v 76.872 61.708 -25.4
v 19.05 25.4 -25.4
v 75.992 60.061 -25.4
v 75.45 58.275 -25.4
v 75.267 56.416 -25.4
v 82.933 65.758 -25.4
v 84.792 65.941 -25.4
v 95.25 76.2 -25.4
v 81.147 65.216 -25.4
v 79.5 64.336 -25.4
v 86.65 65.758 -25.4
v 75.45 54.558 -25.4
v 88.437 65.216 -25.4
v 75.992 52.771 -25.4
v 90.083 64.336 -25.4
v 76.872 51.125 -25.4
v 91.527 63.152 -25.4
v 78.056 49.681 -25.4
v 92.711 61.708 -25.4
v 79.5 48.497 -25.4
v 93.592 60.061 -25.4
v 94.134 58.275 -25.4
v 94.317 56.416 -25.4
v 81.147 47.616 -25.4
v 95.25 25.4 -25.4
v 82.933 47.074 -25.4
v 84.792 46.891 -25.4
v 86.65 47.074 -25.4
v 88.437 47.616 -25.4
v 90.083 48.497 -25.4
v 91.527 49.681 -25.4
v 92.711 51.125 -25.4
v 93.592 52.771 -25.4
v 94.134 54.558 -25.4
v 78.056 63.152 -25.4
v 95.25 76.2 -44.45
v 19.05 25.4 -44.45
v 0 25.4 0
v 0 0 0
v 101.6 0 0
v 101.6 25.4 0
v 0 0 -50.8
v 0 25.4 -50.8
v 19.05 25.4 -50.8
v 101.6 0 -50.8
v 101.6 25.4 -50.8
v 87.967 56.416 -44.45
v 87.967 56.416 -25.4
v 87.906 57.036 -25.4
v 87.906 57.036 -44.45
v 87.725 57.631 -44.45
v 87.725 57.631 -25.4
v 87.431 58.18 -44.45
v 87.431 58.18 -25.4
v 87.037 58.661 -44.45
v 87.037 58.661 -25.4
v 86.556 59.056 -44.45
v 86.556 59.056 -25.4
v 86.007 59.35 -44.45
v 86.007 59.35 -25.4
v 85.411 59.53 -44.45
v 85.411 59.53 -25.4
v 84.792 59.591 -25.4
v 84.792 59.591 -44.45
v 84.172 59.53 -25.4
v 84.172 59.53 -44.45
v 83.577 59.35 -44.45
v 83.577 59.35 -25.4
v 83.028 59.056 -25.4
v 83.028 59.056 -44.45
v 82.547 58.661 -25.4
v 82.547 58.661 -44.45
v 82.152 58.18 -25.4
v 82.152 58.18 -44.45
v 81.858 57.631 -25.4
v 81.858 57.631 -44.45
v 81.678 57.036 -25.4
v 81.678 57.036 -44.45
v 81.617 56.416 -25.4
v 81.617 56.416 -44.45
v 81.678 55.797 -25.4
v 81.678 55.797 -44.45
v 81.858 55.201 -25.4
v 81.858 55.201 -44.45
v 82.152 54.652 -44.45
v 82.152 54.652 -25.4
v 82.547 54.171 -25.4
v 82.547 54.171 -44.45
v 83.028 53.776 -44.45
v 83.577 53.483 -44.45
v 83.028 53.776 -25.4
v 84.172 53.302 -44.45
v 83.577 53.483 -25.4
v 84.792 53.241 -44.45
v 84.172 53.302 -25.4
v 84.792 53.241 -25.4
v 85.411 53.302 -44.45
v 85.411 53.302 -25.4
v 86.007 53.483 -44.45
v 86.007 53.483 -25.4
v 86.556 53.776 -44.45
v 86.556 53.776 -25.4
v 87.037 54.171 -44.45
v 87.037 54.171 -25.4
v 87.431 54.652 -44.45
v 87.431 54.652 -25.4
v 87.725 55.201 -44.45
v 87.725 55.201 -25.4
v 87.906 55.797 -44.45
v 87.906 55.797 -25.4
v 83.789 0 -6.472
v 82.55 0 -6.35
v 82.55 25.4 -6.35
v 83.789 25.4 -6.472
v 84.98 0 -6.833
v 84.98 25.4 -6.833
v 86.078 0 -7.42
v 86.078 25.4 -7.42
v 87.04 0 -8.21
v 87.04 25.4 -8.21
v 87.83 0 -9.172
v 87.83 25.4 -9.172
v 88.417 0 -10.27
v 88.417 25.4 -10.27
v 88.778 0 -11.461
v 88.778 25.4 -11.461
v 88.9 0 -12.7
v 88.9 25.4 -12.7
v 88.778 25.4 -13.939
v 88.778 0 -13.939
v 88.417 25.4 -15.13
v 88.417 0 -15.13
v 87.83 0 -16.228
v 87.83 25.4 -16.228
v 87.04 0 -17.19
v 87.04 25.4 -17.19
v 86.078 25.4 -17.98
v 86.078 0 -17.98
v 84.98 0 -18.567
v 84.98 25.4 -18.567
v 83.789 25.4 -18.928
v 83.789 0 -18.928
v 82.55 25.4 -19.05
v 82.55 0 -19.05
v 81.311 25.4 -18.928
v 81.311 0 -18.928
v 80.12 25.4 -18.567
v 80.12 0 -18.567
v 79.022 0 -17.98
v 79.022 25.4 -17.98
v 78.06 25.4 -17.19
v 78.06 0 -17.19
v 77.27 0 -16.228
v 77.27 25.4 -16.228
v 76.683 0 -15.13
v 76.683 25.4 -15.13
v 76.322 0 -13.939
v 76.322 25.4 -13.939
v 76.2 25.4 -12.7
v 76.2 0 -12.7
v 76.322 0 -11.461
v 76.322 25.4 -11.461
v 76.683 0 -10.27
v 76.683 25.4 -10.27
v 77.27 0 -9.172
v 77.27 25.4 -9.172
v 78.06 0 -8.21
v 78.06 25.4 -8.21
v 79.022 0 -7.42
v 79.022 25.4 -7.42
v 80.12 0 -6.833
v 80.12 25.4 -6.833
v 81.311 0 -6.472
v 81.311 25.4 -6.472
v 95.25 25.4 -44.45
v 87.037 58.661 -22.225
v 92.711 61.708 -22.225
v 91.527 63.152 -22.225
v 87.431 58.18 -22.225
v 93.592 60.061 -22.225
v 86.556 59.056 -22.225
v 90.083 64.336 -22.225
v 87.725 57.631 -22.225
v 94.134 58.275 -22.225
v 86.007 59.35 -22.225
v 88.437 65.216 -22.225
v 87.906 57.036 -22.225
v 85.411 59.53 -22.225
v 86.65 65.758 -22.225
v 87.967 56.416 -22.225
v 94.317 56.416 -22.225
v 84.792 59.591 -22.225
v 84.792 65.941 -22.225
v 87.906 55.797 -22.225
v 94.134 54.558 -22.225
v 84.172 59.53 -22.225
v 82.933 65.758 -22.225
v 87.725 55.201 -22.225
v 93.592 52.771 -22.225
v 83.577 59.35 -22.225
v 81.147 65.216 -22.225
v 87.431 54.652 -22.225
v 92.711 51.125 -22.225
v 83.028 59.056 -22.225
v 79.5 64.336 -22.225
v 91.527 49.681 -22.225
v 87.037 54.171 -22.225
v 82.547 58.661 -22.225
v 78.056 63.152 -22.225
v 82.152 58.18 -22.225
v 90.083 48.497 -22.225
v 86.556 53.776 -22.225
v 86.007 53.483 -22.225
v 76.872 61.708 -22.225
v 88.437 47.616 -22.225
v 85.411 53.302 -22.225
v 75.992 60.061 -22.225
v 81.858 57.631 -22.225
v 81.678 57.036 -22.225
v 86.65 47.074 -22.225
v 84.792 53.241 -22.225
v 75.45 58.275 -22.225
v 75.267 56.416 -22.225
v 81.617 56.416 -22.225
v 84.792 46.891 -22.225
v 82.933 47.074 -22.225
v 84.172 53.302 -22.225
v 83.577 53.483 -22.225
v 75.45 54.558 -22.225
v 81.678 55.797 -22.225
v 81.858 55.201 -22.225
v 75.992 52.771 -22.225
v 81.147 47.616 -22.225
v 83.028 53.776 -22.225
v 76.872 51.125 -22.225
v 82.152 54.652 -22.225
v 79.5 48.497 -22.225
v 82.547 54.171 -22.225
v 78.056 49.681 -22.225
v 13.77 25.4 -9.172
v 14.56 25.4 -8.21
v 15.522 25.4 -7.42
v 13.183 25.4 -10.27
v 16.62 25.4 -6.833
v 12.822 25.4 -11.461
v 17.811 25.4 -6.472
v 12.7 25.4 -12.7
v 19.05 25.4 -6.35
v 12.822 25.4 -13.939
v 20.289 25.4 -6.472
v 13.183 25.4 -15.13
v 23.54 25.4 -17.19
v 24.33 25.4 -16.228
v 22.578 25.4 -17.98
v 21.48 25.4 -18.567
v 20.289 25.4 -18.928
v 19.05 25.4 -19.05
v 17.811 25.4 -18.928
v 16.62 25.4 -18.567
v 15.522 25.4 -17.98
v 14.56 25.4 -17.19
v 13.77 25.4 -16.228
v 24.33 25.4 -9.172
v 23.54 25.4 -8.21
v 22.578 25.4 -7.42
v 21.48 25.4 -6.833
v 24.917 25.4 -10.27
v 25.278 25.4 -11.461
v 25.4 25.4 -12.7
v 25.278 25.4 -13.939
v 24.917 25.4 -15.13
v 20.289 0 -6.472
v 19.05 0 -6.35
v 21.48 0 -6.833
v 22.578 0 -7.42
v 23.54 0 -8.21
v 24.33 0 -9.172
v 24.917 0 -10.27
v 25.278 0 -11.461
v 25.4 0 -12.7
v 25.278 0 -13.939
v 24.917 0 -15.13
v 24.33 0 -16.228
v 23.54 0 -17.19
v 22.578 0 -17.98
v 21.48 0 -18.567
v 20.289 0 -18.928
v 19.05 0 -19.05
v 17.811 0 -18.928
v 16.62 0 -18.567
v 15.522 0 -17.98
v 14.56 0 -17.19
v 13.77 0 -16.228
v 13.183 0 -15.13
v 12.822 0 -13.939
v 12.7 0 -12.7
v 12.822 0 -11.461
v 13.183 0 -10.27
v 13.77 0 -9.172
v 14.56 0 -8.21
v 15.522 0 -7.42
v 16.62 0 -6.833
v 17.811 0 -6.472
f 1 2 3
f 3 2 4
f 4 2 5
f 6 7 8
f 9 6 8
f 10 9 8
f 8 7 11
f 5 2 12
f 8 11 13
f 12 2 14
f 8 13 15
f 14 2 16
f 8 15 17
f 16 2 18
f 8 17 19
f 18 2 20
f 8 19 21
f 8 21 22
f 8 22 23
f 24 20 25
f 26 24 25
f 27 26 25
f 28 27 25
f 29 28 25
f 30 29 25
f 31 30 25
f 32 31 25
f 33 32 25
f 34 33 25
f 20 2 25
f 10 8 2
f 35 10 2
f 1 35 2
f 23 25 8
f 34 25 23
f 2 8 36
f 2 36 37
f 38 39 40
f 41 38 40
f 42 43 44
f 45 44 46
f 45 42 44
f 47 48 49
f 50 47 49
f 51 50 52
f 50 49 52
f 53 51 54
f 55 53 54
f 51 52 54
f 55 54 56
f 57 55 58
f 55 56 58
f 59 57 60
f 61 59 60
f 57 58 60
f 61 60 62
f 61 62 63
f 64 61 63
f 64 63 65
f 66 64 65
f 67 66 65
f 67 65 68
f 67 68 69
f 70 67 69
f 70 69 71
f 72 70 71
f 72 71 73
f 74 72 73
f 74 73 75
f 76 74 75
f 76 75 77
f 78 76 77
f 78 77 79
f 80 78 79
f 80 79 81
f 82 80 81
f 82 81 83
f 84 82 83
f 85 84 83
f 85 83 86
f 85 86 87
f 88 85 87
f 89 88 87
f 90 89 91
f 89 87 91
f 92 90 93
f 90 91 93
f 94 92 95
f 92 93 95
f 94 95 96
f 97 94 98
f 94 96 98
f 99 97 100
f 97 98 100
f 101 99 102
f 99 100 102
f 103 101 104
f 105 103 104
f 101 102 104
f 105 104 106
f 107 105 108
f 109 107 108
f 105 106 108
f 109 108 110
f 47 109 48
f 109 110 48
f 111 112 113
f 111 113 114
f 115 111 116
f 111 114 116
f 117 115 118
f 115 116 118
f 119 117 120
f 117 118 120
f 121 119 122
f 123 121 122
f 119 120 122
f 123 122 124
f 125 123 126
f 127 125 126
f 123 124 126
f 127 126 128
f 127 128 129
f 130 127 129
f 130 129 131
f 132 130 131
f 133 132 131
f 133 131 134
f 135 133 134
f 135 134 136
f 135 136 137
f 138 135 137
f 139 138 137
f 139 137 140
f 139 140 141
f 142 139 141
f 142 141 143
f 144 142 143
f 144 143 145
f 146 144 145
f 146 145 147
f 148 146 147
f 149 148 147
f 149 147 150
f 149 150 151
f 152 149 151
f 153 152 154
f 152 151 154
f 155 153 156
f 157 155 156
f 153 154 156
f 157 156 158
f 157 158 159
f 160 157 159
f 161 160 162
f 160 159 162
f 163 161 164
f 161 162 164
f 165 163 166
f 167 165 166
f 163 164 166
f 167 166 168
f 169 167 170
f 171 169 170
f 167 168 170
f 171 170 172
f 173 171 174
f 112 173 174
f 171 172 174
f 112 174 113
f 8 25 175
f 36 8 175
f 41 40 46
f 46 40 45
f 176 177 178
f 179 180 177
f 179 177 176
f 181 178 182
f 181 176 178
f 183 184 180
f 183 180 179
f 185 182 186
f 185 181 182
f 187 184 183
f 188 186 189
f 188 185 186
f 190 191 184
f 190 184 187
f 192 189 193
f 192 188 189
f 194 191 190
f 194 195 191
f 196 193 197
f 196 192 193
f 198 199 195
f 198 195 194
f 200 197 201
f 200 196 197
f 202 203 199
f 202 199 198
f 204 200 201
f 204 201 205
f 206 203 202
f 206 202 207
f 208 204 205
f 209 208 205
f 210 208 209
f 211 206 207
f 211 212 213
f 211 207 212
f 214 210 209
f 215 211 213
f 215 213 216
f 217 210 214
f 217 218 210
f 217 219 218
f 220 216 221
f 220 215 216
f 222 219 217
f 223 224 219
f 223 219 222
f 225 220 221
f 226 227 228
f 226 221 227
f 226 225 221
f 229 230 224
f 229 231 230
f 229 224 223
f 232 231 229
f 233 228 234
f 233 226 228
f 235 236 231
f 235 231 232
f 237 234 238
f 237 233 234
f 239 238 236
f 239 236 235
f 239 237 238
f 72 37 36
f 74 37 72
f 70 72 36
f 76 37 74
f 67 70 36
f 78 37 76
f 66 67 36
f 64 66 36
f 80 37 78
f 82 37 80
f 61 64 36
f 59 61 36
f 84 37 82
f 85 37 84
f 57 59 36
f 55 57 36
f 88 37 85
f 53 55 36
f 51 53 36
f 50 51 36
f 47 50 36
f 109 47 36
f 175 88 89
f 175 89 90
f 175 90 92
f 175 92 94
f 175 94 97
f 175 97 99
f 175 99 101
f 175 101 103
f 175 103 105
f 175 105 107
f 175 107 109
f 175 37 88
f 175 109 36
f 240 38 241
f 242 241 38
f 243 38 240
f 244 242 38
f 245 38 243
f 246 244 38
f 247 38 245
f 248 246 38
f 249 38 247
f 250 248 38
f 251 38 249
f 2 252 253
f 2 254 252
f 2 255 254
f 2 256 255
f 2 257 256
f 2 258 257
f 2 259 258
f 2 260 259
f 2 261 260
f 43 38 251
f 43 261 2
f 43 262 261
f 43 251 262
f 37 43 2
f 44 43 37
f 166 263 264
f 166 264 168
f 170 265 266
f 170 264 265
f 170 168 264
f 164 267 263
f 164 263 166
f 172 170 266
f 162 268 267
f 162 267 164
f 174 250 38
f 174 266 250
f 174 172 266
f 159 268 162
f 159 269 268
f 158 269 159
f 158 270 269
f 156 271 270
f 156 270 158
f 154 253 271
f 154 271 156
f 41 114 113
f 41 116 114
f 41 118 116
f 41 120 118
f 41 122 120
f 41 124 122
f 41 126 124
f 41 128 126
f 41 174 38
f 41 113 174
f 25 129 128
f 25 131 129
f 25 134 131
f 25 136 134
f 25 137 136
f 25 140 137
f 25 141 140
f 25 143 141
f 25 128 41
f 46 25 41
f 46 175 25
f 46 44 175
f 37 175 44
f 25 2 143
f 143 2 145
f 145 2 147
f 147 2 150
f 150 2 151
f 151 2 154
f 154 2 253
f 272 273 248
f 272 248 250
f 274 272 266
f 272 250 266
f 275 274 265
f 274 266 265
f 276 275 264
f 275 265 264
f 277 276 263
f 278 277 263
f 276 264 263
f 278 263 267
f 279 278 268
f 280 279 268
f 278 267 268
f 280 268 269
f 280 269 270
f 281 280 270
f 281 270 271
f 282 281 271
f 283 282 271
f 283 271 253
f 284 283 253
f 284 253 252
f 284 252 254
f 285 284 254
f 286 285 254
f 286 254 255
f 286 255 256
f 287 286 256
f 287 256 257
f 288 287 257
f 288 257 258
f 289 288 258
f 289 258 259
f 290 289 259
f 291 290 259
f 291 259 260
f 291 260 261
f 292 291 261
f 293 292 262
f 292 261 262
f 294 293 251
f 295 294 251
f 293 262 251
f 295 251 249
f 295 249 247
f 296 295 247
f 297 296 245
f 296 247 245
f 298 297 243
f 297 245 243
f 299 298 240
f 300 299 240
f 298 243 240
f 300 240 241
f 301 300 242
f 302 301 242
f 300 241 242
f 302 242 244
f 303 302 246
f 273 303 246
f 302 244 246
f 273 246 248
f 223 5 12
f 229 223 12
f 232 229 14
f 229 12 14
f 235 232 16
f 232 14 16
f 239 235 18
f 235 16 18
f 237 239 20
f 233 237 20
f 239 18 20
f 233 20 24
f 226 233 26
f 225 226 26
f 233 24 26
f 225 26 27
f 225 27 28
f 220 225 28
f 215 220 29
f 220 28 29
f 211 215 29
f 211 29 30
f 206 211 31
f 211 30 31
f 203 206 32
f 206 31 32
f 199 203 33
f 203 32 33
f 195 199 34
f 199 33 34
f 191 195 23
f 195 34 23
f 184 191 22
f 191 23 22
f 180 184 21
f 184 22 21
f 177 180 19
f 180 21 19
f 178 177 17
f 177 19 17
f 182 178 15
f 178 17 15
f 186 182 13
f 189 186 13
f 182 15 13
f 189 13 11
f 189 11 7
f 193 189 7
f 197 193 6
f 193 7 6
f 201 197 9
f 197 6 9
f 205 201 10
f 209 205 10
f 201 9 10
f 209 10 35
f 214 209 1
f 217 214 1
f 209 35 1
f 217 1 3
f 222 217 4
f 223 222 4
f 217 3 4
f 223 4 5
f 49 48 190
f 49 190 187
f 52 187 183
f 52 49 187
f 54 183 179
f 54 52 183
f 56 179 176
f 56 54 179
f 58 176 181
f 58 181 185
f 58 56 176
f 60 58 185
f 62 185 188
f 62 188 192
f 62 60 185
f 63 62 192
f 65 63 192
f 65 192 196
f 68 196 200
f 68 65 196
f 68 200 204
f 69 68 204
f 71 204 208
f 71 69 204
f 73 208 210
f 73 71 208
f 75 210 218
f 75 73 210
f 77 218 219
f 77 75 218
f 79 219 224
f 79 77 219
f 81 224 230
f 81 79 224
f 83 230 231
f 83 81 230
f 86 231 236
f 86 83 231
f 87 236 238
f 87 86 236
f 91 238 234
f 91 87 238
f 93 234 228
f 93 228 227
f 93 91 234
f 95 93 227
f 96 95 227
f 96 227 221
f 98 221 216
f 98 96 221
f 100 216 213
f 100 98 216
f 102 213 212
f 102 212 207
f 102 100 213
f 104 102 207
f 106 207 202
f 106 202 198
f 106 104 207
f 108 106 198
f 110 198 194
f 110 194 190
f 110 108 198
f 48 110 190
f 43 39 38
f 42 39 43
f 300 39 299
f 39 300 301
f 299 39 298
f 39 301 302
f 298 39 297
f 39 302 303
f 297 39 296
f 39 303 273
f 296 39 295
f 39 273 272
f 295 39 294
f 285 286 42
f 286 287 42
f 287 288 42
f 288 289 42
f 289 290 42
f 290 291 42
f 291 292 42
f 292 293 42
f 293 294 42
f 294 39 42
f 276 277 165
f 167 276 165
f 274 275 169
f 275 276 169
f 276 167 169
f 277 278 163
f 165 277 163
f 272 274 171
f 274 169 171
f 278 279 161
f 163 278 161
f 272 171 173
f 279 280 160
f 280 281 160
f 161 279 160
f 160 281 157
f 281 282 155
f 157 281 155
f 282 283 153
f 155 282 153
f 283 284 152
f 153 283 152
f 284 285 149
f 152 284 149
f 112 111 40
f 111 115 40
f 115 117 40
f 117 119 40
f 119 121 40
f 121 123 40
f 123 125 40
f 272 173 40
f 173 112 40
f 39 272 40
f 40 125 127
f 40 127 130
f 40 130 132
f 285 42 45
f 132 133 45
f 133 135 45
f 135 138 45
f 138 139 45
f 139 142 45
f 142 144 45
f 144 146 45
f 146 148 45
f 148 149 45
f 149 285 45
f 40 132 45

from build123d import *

# Parameters (mm, degrees)
SKETCH1_W           = 101.6
SKETCH1_H           = 50.8
BOSS_EXTRUDE1_DEPTH = 25.4
SKETCH2_W           = 76.2
SKETCH2_H           = 19.05
BOSS_EXTRUDE2_DEPTH = 50.8
CUT_EXTRUDE1_DEPTH  = 26.4
SKETCH4_R           = 3.175
CUT_EXTRUDE3_DEPTH  = 26.4
SKETCH4_3_R         = 9.525
SKETCH4_3_R_2       = 3.175
BOSS_EXTRUDE3_DEPTH = 3.175
SKETCH5_R           = 6.35
CUT_EXTRUDE4_DEPTH  = 26.4


with BuildPart() as part:
    # Sketch1 → Boss-Extrude1 (new body)
    with BuildSketch(Plane(origin=(0, 0, 0), x_dir=(1, 0, 0), z_dir=(0, 1, 0))):
        with Locations((50.8, 25.4)):
            Rectangle(SKETCH1_W, SKETCH1_H)
    extrude(amount=BOSS_EXTRUDE1_DEPTH)

    # Sketch2 → Boss-Extrude2 (add)
    with BuildSketch(Plane(origin=(0, 25.4, 0), x_dir=(1, 0, 0), z_dir=(0, 1, 0))):
        with Locations((57.15, 34.925)):
            Rectangle(SKETCH2_W, SKETCH2_H)
    extrude(amount=BOSS_EXTRUDE2_DEPTH)

    # Sketch3 → Cut-Extrude1 (cut, through all)
    with BuildSketch(Plane.XY.offset(-25.4)):
        Polygon((19.05, 76.2), (95.25, 76.2), (19.05, 25.4), align=None)
    extrude(amount=-CUT_EXTRUDE1_DEPTH, mode=Mode.SUBTRACT)

    # Sketch4 → Cut-Extrude3 (cut, through all)
    with BuildSketch(Plane.XY.offset(-25.4)):
        with Locations((84.791572172, 56.416317707)):
            Circle(SKETCH4_R)
    extrude(amount=-CUT_EXTRUDE3_DEPTH, mode=Mode.SUBTRACT)

    # Sketch4_3 → Boss-Extrude3 (add)
    with BuildSketch(Plane.XY.offset(-25.4)):
        with Locations(Location((84.791572172, 56.416317707, 0), (0, 0, 180))):  # turned: the seam where the file's is
            Circle(SKETCH4_3_R)
        with Locations((84.791572172, 56.416317707)):
            Circle(SKETCH4_3_R_2, mode=Mode.SUBTRACT)
    extrude(amount=BOSS_EXTRUDE3_DEPTH)

    # Sketch5 → Cut-Extrude4 (cut, through all)
    with BuildSketch(Plane(origin=(0, 25.4, 0), x_dir=(1, 0, 0), z_dir=(0, 1, 0))):
        with Locations(Location((19.05, 12.7, 0), (0, 0, 270))):  # turned: the seam where the file's is
            Circle(SKETCH5_R)
        with Locations(Location((82.55, 12.7, 0), (0, 0, 270))):  # turned: the seam where the file's is
            Circle(SKETCH5_R)
    extrude(amount=-CUT_EXTRUDE4_DEPTH, mode=Mode.SUBTRACT)


solid = part.part
